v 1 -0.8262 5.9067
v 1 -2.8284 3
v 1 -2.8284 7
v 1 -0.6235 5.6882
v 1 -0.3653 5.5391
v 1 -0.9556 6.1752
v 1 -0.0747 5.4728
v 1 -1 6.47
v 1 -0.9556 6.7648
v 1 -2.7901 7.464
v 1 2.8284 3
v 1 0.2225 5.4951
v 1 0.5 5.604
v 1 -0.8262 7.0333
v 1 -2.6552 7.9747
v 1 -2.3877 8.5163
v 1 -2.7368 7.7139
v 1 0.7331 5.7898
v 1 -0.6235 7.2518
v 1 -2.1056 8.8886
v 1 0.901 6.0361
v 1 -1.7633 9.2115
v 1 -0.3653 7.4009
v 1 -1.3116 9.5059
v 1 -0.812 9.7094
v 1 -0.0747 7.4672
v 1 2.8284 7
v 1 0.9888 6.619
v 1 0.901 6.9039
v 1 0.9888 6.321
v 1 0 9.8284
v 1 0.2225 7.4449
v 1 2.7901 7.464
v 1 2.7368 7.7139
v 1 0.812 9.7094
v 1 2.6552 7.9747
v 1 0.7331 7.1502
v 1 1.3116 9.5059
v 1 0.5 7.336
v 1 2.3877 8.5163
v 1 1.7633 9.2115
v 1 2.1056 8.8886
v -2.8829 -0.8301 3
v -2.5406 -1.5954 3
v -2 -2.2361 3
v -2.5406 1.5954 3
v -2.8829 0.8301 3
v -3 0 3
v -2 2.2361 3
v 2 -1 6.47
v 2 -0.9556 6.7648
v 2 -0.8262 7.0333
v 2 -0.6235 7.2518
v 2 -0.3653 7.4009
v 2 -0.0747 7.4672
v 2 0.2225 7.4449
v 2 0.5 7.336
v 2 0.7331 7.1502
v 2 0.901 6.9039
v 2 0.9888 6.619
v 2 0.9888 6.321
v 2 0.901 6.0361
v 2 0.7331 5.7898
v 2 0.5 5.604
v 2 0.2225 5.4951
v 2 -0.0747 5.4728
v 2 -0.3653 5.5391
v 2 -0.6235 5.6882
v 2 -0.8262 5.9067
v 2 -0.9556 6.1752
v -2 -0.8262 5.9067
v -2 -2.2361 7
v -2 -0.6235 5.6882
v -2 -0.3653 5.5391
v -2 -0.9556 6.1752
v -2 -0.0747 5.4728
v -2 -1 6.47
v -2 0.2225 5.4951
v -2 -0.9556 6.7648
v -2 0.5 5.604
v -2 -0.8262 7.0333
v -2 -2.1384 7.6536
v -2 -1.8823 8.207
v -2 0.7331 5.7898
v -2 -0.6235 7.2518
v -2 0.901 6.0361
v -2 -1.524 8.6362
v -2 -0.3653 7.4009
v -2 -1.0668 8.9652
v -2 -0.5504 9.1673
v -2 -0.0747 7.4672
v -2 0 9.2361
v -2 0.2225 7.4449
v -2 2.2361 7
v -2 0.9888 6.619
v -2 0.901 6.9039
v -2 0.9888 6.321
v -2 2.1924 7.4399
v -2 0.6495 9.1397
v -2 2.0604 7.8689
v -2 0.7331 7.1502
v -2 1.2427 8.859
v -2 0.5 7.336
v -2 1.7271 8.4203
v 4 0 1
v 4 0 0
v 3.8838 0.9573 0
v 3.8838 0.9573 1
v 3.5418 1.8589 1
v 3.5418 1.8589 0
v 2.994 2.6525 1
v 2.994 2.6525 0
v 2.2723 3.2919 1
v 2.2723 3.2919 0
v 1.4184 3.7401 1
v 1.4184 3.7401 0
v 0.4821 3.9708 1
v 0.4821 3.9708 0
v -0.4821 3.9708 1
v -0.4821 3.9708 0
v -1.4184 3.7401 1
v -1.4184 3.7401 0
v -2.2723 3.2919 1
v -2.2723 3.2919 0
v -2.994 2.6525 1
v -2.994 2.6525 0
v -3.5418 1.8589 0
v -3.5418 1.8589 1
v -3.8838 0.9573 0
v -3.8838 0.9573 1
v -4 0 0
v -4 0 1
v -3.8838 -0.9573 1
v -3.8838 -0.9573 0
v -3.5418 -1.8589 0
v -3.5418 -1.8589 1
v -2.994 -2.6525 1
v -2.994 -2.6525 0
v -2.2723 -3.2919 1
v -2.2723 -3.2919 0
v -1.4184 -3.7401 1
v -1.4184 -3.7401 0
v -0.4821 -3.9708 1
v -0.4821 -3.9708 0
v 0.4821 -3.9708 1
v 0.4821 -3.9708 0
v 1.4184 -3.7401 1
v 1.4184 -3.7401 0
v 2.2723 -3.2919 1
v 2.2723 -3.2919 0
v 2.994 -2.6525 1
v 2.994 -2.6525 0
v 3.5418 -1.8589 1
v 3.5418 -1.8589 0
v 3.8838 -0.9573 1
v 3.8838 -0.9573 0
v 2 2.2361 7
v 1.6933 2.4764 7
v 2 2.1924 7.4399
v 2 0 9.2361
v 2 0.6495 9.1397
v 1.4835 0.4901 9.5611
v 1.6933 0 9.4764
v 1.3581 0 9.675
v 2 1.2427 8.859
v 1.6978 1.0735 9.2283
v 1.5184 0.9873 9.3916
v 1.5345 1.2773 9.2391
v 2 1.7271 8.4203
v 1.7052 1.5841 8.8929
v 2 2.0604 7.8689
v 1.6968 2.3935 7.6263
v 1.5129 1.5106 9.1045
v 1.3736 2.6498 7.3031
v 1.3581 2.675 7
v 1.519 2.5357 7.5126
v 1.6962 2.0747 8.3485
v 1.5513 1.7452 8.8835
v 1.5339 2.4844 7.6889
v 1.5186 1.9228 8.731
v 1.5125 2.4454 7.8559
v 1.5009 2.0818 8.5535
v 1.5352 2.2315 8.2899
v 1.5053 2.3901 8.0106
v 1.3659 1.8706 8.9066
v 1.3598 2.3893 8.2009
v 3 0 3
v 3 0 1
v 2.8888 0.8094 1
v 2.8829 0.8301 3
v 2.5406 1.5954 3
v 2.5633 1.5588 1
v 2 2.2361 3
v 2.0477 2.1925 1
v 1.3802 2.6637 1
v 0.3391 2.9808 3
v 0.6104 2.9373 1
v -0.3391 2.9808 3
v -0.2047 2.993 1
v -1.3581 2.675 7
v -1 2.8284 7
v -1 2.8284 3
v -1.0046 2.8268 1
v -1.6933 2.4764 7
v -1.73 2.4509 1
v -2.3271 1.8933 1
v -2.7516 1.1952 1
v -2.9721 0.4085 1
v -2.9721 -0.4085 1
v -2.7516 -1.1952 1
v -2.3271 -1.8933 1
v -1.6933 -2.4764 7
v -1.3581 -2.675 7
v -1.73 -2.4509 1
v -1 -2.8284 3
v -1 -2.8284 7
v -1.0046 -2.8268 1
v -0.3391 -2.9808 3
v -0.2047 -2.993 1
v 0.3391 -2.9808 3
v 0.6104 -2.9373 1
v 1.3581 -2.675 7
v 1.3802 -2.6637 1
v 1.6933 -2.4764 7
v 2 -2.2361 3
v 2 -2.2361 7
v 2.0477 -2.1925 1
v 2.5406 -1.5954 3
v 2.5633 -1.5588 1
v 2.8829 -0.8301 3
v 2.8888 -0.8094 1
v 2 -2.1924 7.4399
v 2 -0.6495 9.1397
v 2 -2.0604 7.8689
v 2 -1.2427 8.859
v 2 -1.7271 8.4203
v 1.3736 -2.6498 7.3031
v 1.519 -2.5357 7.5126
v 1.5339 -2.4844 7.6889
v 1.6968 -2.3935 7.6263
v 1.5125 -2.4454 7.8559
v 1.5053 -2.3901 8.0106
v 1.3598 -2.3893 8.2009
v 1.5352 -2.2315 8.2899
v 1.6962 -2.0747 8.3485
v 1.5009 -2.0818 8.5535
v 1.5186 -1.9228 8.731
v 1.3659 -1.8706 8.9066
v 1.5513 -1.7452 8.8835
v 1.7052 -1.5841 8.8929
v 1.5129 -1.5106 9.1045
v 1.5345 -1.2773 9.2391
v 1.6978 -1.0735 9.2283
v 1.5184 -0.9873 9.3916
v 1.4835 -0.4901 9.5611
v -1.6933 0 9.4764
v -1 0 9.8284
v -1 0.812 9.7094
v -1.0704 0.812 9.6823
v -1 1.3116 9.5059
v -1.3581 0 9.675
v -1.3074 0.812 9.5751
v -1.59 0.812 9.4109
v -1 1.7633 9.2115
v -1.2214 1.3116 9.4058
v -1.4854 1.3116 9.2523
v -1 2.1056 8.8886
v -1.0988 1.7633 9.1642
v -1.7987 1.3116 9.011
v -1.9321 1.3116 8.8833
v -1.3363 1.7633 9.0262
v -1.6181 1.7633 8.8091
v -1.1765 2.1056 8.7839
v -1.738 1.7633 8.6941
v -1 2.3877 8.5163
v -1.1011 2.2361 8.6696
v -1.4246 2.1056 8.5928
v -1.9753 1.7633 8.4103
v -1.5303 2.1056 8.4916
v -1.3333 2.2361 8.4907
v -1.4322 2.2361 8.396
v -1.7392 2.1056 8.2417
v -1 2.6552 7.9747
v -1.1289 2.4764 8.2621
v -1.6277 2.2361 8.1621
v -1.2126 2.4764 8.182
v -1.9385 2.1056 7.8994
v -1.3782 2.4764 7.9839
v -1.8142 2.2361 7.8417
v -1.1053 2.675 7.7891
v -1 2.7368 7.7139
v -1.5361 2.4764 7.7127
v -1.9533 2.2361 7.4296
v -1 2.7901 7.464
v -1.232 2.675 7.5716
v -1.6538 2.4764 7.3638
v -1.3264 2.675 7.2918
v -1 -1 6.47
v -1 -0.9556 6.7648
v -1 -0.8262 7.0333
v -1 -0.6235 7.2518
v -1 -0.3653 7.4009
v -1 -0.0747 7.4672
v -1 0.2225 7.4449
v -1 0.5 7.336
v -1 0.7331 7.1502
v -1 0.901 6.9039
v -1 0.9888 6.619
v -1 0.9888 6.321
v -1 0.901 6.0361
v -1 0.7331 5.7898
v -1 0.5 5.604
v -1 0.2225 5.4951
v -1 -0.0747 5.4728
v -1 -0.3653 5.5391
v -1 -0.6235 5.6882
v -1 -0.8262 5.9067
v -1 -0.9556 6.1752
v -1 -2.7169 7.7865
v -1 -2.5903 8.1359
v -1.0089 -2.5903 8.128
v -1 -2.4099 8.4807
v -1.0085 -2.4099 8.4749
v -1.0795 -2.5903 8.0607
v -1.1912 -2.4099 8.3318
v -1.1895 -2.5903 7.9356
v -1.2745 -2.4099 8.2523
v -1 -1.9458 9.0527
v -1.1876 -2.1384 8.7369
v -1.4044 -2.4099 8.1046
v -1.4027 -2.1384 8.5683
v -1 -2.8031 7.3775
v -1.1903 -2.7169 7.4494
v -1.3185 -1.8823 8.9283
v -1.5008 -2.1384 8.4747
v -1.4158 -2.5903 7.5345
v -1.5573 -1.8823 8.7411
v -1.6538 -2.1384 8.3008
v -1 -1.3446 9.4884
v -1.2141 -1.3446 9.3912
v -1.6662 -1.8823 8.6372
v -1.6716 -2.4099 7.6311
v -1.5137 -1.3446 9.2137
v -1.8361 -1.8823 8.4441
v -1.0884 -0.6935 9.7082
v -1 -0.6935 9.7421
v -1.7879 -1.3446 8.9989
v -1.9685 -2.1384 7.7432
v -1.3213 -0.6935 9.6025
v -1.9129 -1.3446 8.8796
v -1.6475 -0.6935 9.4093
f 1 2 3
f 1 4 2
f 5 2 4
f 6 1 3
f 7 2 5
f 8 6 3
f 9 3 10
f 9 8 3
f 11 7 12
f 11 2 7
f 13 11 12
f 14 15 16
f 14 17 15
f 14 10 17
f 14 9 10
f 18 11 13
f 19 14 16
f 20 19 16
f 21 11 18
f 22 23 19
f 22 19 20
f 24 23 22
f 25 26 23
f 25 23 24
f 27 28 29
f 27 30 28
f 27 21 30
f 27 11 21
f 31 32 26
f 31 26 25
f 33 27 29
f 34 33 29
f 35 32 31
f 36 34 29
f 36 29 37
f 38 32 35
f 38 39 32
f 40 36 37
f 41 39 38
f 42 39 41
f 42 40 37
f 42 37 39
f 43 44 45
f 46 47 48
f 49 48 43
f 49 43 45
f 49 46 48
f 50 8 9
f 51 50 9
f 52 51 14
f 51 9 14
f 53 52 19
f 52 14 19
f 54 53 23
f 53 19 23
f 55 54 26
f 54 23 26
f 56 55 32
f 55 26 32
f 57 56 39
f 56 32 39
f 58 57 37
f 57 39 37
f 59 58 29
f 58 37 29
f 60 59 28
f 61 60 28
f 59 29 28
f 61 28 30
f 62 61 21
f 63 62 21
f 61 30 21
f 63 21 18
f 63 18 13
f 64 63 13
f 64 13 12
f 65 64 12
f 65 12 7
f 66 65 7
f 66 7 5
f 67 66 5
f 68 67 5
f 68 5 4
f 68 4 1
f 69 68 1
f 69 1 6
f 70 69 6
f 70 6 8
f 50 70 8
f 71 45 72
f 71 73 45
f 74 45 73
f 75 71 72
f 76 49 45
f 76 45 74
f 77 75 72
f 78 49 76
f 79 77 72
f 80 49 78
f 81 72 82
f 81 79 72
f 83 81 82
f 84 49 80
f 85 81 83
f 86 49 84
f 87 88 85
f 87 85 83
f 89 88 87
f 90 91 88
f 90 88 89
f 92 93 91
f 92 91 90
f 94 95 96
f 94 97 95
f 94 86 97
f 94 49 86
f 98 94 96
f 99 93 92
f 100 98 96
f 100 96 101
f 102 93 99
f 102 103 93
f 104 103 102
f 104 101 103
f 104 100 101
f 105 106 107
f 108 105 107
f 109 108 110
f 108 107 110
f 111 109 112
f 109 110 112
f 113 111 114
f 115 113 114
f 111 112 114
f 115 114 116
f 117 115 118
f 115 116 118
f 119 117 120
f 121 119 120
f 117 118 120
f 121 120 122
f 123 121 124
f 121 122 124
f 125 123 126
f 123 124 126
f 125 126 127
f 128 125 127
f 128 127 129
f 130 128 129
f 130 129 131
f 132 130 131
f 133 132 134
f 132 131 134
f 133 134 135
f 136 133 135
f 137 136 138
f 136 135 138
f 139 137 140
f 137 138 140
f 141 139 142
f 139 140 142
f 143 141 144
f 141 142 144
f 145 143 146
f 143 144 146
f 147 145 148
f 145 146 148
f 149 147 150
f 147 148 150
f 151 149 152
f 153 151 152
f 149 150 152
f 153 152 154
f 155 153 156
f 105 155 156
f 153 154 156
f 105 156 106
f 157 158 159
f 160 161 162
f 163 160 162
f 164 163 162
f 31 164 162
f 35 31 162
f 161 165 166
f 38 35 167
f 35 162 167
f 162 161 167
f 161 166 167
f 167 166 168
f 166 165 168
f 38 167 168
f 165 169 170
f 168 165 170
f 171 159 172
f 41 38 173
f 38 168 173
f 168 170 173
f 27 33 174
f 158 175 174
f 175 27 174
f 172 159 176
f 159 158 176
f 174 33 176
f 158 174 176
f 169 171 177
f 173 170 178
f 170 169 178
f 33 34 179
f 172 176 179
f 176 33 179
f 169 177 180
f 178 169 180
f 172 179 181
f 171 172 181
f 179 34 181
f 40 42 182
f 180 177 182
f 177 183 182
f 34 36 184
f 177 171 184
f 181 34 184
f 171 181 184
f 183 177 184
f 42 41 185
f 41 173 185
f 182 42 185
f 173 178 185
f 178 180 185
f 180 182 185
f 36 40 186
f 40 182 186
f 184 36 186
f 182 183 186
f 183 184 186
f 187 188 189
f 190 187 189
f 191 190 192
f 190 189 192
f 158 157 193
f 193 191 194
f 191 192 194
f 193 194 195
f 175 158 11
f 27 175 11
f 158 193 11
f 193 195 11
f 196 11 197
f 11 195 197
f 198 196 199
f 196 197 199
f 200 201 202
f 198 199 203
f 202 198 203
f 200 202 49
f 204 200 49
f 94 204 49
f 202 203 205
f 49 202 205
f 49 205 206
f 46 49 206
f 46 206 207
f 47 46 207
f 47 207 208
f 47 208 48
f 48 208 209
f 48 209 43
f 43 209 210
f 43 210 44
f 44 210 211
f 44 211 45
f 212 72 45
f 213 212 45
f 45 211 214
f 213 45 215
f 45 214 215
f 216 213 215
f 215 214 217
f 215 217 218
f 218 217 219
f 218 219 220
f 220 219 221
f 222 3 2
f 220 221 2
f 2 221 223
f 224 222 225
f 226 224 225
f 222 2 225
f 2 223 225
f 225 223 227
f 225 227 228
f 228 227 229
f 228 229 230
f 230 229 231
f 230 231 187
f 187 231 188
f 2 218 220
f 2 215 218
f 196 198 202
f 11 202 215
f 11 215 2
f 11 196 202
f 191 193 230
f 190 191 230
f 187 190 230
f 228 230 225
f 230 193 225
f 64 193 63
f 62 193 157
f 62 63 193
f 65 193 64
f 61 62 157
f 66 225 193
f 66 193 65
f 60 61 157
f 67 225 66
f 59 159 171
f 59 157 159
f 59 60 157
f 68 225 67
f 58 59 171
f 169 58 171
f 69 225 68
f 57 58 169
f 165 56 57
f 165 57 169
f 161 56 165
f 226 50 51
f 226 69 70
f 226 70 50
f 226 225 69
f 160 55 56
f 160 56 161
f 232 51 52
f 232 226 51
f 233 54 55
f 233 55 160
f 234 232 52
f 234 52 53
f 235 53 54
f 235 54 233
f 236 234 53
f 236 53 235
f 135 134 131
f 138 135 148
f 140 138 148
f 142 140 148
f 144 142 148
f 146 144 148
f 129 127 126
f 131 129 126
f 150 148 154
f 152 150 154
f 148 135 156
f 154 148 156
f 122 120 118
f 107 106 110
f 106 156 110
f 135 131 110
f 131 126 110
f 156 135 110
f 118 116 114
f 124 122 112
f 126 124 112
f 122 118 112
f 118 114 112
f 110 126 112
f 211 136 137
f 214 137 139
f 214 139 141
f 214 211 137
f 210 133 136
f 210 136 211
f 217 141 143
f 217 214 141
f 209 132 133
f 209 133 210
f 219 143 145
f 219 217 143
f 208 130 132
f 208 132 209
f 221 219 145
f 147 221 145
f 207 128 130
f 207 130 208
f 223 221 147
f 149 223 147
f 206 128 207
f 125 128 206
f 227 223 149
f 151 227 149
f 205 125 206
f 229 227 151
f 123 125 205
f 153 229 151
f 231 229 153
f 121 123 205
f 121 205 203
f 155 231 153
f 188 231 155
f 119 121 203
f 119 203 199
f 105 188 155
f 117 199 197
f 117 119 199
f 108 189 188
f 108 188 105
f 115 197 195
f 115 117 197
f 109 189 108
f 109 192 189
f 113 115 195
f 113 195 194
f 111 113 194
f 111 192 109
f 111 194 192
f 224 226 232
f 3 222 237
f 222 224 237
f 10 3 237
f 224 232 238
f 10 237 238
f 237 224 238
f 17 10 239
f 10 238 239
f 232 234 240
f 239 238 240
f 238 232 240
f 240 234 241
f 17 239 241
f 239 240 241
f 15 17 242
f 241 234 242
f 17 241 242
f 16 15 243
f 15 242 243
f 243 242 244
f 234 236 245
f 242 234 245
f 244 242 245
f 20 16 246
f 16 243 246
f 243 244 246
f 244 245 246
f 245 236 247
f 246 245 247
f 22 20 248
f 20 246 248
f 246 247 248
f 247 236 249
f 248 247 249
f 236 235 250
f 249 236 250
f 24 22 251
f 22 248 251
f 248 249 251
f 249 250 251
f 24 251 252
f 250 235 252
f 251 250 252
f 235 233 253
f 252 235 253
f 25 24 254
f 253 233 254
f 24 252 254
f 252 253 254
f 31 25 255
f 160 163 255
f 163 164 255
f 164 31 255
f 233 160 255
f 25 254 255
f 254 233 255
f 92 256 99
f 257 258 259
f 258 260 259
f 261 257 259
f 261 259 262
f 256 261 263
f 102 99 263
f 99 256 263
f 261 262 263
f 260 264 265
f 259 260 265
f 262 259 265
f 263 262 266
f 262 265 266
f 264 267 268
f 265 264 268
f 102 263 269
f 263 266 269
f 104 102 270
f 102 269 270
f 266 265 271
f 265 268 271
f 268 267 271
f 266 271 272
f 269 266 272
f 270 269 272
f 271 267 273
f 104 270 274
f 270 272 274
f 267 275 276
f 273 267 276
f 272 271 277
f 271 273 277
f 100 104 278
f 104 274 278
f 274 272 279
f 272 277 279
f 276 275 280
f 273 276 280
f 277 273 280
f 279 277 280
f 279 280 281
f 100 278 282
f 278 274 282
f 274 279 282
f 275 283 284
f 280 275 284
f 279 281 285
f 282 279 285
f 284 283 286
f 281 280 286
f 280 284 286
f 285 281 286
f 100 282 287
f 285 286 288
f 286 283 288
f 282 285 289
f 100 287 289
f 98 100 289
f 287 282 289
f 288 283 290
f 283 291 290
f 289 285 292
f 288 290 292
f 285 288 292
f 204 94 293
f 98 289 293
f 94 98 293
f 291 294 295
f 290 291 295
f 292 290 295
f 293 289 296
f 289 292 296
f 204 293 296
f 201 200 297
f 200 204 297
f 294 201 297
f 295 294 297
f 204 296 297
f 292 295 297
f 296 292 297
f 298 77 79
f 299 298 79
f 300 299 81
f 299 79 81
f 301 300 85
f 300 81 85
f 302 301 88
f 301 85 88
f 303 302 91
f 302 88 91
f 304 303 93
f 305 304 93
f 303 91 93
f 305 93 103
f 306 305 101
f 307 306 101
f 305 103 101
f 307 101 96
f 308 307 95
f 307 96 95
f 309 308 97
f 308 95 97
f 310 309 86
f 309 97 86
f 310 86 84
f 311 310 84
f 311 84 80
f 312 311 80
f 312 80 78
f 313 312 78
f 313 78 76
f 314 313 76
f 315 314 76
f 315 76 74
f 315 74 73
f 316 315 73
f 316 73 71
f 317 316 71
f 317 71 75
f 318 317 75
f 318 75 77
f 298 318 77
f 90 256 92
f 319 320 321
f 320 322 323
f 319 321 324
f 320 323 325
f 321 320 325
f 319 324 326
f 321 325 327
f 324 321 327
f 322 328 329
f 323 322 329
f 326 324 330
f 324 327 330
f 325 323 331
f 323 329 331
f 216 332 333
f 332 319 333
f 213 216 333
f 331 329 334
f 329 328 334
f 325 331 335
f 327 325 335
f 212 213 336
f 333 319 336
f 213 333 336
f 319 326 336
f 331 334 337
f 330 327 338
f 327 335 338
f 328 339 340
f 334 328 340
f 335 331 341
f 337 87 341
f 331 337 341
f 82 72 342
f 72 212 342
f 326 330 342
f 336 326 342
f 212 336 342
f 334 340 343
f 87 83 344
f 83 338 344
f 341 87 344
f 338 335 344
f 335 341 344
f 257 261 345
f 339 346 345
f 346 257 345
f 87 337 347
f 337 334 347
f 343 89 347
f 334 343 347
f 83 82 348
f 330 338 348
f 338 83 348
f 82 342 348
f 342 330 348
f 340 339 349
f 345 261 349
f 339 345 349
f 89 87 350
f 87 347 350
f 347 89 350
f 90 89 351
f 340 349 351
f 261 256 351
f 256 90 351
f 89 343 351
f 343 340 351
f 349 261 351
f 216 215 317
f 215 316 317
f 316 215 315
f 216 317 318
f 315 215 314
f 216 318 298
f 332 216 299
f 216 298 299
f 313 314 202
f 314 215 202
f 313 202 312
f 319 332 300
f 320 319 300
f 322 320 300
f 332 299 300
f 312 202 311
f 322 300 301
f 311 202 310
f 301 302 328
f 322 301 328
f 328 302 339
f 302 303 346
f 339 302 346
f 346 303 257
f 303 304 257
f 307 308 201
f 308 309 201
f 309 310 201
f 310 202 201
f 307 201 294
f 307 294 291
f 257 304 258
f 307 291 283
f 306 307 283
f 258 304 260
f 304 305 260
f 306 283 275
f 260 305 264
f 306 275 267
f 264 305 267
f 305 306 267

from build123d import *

# Parameters (mm, degrees)
F0_R     = 4
F1_DEPTH = 1
F2_R     = 3
F3_DEPTH = 6
F6_W     = 2
F6_H     = 8.928134
F6_W_2   = 2.979646
F7_DEPTH = 12.5
F8_R     = 1
F9_DEPTH = 6.001


with BuildPart() as f1:
    # F0 (on Top) → F1 (new body)
    with BuildSketch(Plane.XY):
        Circle(F0_R)
    extrude(amount=F1_DEPTH)

    # F2 (on face) → F3 (join)
    with BuildSketch(Plane.XY.offset(1)):
        Circle(F2_R)
    extrude(amount=F3_DEPTH)

    # F4 (on face) → F5 (revolve)
    with BuildSketch(Plane.XY.offset(7)):
        with BuildLine():
            ThreePointArc((0, -3), (2.12132, -2.12132), (3, 0))
            ThreePointArc((3, 0), (2.12132, 2.12132), (0, 3))
            Line((0, 3), (0, -3))
        make_face()
    revolve(axis=Axis((0, 0, 7), (0, -1, 0)))

    # F6 (on Front) → F7 (cut, symmetric)
    with BuildSketch(Plane.XZ):
        with Locations((0, 7.464067)):
            Rectangle(F6_W, F6_H)
        with Locations((-3.489823, 7.464067)):
            Rectangle(F6_W_2, F6_H)
        with Locations((3.489823, 7.464067)):
            Rectangle(F6_W_2, F6_H)
    extrude(amount=F7_DEPTH, both=True, mode=Mode.SUBTRACT)

    # F8 (on face) → F9 (cut, through all)
    with BuildSketch(Plane(origin=(-2, 0, 0), x_dir=(0, -1, 0), z_dir=(-1, 0, 0))):
        with Locations((0, 6.470004)):
            Circle(F8_R)
    extrude(amount=-F9_DEPTH, mode=Mode.SUBTRACT)


solid = f1.part
